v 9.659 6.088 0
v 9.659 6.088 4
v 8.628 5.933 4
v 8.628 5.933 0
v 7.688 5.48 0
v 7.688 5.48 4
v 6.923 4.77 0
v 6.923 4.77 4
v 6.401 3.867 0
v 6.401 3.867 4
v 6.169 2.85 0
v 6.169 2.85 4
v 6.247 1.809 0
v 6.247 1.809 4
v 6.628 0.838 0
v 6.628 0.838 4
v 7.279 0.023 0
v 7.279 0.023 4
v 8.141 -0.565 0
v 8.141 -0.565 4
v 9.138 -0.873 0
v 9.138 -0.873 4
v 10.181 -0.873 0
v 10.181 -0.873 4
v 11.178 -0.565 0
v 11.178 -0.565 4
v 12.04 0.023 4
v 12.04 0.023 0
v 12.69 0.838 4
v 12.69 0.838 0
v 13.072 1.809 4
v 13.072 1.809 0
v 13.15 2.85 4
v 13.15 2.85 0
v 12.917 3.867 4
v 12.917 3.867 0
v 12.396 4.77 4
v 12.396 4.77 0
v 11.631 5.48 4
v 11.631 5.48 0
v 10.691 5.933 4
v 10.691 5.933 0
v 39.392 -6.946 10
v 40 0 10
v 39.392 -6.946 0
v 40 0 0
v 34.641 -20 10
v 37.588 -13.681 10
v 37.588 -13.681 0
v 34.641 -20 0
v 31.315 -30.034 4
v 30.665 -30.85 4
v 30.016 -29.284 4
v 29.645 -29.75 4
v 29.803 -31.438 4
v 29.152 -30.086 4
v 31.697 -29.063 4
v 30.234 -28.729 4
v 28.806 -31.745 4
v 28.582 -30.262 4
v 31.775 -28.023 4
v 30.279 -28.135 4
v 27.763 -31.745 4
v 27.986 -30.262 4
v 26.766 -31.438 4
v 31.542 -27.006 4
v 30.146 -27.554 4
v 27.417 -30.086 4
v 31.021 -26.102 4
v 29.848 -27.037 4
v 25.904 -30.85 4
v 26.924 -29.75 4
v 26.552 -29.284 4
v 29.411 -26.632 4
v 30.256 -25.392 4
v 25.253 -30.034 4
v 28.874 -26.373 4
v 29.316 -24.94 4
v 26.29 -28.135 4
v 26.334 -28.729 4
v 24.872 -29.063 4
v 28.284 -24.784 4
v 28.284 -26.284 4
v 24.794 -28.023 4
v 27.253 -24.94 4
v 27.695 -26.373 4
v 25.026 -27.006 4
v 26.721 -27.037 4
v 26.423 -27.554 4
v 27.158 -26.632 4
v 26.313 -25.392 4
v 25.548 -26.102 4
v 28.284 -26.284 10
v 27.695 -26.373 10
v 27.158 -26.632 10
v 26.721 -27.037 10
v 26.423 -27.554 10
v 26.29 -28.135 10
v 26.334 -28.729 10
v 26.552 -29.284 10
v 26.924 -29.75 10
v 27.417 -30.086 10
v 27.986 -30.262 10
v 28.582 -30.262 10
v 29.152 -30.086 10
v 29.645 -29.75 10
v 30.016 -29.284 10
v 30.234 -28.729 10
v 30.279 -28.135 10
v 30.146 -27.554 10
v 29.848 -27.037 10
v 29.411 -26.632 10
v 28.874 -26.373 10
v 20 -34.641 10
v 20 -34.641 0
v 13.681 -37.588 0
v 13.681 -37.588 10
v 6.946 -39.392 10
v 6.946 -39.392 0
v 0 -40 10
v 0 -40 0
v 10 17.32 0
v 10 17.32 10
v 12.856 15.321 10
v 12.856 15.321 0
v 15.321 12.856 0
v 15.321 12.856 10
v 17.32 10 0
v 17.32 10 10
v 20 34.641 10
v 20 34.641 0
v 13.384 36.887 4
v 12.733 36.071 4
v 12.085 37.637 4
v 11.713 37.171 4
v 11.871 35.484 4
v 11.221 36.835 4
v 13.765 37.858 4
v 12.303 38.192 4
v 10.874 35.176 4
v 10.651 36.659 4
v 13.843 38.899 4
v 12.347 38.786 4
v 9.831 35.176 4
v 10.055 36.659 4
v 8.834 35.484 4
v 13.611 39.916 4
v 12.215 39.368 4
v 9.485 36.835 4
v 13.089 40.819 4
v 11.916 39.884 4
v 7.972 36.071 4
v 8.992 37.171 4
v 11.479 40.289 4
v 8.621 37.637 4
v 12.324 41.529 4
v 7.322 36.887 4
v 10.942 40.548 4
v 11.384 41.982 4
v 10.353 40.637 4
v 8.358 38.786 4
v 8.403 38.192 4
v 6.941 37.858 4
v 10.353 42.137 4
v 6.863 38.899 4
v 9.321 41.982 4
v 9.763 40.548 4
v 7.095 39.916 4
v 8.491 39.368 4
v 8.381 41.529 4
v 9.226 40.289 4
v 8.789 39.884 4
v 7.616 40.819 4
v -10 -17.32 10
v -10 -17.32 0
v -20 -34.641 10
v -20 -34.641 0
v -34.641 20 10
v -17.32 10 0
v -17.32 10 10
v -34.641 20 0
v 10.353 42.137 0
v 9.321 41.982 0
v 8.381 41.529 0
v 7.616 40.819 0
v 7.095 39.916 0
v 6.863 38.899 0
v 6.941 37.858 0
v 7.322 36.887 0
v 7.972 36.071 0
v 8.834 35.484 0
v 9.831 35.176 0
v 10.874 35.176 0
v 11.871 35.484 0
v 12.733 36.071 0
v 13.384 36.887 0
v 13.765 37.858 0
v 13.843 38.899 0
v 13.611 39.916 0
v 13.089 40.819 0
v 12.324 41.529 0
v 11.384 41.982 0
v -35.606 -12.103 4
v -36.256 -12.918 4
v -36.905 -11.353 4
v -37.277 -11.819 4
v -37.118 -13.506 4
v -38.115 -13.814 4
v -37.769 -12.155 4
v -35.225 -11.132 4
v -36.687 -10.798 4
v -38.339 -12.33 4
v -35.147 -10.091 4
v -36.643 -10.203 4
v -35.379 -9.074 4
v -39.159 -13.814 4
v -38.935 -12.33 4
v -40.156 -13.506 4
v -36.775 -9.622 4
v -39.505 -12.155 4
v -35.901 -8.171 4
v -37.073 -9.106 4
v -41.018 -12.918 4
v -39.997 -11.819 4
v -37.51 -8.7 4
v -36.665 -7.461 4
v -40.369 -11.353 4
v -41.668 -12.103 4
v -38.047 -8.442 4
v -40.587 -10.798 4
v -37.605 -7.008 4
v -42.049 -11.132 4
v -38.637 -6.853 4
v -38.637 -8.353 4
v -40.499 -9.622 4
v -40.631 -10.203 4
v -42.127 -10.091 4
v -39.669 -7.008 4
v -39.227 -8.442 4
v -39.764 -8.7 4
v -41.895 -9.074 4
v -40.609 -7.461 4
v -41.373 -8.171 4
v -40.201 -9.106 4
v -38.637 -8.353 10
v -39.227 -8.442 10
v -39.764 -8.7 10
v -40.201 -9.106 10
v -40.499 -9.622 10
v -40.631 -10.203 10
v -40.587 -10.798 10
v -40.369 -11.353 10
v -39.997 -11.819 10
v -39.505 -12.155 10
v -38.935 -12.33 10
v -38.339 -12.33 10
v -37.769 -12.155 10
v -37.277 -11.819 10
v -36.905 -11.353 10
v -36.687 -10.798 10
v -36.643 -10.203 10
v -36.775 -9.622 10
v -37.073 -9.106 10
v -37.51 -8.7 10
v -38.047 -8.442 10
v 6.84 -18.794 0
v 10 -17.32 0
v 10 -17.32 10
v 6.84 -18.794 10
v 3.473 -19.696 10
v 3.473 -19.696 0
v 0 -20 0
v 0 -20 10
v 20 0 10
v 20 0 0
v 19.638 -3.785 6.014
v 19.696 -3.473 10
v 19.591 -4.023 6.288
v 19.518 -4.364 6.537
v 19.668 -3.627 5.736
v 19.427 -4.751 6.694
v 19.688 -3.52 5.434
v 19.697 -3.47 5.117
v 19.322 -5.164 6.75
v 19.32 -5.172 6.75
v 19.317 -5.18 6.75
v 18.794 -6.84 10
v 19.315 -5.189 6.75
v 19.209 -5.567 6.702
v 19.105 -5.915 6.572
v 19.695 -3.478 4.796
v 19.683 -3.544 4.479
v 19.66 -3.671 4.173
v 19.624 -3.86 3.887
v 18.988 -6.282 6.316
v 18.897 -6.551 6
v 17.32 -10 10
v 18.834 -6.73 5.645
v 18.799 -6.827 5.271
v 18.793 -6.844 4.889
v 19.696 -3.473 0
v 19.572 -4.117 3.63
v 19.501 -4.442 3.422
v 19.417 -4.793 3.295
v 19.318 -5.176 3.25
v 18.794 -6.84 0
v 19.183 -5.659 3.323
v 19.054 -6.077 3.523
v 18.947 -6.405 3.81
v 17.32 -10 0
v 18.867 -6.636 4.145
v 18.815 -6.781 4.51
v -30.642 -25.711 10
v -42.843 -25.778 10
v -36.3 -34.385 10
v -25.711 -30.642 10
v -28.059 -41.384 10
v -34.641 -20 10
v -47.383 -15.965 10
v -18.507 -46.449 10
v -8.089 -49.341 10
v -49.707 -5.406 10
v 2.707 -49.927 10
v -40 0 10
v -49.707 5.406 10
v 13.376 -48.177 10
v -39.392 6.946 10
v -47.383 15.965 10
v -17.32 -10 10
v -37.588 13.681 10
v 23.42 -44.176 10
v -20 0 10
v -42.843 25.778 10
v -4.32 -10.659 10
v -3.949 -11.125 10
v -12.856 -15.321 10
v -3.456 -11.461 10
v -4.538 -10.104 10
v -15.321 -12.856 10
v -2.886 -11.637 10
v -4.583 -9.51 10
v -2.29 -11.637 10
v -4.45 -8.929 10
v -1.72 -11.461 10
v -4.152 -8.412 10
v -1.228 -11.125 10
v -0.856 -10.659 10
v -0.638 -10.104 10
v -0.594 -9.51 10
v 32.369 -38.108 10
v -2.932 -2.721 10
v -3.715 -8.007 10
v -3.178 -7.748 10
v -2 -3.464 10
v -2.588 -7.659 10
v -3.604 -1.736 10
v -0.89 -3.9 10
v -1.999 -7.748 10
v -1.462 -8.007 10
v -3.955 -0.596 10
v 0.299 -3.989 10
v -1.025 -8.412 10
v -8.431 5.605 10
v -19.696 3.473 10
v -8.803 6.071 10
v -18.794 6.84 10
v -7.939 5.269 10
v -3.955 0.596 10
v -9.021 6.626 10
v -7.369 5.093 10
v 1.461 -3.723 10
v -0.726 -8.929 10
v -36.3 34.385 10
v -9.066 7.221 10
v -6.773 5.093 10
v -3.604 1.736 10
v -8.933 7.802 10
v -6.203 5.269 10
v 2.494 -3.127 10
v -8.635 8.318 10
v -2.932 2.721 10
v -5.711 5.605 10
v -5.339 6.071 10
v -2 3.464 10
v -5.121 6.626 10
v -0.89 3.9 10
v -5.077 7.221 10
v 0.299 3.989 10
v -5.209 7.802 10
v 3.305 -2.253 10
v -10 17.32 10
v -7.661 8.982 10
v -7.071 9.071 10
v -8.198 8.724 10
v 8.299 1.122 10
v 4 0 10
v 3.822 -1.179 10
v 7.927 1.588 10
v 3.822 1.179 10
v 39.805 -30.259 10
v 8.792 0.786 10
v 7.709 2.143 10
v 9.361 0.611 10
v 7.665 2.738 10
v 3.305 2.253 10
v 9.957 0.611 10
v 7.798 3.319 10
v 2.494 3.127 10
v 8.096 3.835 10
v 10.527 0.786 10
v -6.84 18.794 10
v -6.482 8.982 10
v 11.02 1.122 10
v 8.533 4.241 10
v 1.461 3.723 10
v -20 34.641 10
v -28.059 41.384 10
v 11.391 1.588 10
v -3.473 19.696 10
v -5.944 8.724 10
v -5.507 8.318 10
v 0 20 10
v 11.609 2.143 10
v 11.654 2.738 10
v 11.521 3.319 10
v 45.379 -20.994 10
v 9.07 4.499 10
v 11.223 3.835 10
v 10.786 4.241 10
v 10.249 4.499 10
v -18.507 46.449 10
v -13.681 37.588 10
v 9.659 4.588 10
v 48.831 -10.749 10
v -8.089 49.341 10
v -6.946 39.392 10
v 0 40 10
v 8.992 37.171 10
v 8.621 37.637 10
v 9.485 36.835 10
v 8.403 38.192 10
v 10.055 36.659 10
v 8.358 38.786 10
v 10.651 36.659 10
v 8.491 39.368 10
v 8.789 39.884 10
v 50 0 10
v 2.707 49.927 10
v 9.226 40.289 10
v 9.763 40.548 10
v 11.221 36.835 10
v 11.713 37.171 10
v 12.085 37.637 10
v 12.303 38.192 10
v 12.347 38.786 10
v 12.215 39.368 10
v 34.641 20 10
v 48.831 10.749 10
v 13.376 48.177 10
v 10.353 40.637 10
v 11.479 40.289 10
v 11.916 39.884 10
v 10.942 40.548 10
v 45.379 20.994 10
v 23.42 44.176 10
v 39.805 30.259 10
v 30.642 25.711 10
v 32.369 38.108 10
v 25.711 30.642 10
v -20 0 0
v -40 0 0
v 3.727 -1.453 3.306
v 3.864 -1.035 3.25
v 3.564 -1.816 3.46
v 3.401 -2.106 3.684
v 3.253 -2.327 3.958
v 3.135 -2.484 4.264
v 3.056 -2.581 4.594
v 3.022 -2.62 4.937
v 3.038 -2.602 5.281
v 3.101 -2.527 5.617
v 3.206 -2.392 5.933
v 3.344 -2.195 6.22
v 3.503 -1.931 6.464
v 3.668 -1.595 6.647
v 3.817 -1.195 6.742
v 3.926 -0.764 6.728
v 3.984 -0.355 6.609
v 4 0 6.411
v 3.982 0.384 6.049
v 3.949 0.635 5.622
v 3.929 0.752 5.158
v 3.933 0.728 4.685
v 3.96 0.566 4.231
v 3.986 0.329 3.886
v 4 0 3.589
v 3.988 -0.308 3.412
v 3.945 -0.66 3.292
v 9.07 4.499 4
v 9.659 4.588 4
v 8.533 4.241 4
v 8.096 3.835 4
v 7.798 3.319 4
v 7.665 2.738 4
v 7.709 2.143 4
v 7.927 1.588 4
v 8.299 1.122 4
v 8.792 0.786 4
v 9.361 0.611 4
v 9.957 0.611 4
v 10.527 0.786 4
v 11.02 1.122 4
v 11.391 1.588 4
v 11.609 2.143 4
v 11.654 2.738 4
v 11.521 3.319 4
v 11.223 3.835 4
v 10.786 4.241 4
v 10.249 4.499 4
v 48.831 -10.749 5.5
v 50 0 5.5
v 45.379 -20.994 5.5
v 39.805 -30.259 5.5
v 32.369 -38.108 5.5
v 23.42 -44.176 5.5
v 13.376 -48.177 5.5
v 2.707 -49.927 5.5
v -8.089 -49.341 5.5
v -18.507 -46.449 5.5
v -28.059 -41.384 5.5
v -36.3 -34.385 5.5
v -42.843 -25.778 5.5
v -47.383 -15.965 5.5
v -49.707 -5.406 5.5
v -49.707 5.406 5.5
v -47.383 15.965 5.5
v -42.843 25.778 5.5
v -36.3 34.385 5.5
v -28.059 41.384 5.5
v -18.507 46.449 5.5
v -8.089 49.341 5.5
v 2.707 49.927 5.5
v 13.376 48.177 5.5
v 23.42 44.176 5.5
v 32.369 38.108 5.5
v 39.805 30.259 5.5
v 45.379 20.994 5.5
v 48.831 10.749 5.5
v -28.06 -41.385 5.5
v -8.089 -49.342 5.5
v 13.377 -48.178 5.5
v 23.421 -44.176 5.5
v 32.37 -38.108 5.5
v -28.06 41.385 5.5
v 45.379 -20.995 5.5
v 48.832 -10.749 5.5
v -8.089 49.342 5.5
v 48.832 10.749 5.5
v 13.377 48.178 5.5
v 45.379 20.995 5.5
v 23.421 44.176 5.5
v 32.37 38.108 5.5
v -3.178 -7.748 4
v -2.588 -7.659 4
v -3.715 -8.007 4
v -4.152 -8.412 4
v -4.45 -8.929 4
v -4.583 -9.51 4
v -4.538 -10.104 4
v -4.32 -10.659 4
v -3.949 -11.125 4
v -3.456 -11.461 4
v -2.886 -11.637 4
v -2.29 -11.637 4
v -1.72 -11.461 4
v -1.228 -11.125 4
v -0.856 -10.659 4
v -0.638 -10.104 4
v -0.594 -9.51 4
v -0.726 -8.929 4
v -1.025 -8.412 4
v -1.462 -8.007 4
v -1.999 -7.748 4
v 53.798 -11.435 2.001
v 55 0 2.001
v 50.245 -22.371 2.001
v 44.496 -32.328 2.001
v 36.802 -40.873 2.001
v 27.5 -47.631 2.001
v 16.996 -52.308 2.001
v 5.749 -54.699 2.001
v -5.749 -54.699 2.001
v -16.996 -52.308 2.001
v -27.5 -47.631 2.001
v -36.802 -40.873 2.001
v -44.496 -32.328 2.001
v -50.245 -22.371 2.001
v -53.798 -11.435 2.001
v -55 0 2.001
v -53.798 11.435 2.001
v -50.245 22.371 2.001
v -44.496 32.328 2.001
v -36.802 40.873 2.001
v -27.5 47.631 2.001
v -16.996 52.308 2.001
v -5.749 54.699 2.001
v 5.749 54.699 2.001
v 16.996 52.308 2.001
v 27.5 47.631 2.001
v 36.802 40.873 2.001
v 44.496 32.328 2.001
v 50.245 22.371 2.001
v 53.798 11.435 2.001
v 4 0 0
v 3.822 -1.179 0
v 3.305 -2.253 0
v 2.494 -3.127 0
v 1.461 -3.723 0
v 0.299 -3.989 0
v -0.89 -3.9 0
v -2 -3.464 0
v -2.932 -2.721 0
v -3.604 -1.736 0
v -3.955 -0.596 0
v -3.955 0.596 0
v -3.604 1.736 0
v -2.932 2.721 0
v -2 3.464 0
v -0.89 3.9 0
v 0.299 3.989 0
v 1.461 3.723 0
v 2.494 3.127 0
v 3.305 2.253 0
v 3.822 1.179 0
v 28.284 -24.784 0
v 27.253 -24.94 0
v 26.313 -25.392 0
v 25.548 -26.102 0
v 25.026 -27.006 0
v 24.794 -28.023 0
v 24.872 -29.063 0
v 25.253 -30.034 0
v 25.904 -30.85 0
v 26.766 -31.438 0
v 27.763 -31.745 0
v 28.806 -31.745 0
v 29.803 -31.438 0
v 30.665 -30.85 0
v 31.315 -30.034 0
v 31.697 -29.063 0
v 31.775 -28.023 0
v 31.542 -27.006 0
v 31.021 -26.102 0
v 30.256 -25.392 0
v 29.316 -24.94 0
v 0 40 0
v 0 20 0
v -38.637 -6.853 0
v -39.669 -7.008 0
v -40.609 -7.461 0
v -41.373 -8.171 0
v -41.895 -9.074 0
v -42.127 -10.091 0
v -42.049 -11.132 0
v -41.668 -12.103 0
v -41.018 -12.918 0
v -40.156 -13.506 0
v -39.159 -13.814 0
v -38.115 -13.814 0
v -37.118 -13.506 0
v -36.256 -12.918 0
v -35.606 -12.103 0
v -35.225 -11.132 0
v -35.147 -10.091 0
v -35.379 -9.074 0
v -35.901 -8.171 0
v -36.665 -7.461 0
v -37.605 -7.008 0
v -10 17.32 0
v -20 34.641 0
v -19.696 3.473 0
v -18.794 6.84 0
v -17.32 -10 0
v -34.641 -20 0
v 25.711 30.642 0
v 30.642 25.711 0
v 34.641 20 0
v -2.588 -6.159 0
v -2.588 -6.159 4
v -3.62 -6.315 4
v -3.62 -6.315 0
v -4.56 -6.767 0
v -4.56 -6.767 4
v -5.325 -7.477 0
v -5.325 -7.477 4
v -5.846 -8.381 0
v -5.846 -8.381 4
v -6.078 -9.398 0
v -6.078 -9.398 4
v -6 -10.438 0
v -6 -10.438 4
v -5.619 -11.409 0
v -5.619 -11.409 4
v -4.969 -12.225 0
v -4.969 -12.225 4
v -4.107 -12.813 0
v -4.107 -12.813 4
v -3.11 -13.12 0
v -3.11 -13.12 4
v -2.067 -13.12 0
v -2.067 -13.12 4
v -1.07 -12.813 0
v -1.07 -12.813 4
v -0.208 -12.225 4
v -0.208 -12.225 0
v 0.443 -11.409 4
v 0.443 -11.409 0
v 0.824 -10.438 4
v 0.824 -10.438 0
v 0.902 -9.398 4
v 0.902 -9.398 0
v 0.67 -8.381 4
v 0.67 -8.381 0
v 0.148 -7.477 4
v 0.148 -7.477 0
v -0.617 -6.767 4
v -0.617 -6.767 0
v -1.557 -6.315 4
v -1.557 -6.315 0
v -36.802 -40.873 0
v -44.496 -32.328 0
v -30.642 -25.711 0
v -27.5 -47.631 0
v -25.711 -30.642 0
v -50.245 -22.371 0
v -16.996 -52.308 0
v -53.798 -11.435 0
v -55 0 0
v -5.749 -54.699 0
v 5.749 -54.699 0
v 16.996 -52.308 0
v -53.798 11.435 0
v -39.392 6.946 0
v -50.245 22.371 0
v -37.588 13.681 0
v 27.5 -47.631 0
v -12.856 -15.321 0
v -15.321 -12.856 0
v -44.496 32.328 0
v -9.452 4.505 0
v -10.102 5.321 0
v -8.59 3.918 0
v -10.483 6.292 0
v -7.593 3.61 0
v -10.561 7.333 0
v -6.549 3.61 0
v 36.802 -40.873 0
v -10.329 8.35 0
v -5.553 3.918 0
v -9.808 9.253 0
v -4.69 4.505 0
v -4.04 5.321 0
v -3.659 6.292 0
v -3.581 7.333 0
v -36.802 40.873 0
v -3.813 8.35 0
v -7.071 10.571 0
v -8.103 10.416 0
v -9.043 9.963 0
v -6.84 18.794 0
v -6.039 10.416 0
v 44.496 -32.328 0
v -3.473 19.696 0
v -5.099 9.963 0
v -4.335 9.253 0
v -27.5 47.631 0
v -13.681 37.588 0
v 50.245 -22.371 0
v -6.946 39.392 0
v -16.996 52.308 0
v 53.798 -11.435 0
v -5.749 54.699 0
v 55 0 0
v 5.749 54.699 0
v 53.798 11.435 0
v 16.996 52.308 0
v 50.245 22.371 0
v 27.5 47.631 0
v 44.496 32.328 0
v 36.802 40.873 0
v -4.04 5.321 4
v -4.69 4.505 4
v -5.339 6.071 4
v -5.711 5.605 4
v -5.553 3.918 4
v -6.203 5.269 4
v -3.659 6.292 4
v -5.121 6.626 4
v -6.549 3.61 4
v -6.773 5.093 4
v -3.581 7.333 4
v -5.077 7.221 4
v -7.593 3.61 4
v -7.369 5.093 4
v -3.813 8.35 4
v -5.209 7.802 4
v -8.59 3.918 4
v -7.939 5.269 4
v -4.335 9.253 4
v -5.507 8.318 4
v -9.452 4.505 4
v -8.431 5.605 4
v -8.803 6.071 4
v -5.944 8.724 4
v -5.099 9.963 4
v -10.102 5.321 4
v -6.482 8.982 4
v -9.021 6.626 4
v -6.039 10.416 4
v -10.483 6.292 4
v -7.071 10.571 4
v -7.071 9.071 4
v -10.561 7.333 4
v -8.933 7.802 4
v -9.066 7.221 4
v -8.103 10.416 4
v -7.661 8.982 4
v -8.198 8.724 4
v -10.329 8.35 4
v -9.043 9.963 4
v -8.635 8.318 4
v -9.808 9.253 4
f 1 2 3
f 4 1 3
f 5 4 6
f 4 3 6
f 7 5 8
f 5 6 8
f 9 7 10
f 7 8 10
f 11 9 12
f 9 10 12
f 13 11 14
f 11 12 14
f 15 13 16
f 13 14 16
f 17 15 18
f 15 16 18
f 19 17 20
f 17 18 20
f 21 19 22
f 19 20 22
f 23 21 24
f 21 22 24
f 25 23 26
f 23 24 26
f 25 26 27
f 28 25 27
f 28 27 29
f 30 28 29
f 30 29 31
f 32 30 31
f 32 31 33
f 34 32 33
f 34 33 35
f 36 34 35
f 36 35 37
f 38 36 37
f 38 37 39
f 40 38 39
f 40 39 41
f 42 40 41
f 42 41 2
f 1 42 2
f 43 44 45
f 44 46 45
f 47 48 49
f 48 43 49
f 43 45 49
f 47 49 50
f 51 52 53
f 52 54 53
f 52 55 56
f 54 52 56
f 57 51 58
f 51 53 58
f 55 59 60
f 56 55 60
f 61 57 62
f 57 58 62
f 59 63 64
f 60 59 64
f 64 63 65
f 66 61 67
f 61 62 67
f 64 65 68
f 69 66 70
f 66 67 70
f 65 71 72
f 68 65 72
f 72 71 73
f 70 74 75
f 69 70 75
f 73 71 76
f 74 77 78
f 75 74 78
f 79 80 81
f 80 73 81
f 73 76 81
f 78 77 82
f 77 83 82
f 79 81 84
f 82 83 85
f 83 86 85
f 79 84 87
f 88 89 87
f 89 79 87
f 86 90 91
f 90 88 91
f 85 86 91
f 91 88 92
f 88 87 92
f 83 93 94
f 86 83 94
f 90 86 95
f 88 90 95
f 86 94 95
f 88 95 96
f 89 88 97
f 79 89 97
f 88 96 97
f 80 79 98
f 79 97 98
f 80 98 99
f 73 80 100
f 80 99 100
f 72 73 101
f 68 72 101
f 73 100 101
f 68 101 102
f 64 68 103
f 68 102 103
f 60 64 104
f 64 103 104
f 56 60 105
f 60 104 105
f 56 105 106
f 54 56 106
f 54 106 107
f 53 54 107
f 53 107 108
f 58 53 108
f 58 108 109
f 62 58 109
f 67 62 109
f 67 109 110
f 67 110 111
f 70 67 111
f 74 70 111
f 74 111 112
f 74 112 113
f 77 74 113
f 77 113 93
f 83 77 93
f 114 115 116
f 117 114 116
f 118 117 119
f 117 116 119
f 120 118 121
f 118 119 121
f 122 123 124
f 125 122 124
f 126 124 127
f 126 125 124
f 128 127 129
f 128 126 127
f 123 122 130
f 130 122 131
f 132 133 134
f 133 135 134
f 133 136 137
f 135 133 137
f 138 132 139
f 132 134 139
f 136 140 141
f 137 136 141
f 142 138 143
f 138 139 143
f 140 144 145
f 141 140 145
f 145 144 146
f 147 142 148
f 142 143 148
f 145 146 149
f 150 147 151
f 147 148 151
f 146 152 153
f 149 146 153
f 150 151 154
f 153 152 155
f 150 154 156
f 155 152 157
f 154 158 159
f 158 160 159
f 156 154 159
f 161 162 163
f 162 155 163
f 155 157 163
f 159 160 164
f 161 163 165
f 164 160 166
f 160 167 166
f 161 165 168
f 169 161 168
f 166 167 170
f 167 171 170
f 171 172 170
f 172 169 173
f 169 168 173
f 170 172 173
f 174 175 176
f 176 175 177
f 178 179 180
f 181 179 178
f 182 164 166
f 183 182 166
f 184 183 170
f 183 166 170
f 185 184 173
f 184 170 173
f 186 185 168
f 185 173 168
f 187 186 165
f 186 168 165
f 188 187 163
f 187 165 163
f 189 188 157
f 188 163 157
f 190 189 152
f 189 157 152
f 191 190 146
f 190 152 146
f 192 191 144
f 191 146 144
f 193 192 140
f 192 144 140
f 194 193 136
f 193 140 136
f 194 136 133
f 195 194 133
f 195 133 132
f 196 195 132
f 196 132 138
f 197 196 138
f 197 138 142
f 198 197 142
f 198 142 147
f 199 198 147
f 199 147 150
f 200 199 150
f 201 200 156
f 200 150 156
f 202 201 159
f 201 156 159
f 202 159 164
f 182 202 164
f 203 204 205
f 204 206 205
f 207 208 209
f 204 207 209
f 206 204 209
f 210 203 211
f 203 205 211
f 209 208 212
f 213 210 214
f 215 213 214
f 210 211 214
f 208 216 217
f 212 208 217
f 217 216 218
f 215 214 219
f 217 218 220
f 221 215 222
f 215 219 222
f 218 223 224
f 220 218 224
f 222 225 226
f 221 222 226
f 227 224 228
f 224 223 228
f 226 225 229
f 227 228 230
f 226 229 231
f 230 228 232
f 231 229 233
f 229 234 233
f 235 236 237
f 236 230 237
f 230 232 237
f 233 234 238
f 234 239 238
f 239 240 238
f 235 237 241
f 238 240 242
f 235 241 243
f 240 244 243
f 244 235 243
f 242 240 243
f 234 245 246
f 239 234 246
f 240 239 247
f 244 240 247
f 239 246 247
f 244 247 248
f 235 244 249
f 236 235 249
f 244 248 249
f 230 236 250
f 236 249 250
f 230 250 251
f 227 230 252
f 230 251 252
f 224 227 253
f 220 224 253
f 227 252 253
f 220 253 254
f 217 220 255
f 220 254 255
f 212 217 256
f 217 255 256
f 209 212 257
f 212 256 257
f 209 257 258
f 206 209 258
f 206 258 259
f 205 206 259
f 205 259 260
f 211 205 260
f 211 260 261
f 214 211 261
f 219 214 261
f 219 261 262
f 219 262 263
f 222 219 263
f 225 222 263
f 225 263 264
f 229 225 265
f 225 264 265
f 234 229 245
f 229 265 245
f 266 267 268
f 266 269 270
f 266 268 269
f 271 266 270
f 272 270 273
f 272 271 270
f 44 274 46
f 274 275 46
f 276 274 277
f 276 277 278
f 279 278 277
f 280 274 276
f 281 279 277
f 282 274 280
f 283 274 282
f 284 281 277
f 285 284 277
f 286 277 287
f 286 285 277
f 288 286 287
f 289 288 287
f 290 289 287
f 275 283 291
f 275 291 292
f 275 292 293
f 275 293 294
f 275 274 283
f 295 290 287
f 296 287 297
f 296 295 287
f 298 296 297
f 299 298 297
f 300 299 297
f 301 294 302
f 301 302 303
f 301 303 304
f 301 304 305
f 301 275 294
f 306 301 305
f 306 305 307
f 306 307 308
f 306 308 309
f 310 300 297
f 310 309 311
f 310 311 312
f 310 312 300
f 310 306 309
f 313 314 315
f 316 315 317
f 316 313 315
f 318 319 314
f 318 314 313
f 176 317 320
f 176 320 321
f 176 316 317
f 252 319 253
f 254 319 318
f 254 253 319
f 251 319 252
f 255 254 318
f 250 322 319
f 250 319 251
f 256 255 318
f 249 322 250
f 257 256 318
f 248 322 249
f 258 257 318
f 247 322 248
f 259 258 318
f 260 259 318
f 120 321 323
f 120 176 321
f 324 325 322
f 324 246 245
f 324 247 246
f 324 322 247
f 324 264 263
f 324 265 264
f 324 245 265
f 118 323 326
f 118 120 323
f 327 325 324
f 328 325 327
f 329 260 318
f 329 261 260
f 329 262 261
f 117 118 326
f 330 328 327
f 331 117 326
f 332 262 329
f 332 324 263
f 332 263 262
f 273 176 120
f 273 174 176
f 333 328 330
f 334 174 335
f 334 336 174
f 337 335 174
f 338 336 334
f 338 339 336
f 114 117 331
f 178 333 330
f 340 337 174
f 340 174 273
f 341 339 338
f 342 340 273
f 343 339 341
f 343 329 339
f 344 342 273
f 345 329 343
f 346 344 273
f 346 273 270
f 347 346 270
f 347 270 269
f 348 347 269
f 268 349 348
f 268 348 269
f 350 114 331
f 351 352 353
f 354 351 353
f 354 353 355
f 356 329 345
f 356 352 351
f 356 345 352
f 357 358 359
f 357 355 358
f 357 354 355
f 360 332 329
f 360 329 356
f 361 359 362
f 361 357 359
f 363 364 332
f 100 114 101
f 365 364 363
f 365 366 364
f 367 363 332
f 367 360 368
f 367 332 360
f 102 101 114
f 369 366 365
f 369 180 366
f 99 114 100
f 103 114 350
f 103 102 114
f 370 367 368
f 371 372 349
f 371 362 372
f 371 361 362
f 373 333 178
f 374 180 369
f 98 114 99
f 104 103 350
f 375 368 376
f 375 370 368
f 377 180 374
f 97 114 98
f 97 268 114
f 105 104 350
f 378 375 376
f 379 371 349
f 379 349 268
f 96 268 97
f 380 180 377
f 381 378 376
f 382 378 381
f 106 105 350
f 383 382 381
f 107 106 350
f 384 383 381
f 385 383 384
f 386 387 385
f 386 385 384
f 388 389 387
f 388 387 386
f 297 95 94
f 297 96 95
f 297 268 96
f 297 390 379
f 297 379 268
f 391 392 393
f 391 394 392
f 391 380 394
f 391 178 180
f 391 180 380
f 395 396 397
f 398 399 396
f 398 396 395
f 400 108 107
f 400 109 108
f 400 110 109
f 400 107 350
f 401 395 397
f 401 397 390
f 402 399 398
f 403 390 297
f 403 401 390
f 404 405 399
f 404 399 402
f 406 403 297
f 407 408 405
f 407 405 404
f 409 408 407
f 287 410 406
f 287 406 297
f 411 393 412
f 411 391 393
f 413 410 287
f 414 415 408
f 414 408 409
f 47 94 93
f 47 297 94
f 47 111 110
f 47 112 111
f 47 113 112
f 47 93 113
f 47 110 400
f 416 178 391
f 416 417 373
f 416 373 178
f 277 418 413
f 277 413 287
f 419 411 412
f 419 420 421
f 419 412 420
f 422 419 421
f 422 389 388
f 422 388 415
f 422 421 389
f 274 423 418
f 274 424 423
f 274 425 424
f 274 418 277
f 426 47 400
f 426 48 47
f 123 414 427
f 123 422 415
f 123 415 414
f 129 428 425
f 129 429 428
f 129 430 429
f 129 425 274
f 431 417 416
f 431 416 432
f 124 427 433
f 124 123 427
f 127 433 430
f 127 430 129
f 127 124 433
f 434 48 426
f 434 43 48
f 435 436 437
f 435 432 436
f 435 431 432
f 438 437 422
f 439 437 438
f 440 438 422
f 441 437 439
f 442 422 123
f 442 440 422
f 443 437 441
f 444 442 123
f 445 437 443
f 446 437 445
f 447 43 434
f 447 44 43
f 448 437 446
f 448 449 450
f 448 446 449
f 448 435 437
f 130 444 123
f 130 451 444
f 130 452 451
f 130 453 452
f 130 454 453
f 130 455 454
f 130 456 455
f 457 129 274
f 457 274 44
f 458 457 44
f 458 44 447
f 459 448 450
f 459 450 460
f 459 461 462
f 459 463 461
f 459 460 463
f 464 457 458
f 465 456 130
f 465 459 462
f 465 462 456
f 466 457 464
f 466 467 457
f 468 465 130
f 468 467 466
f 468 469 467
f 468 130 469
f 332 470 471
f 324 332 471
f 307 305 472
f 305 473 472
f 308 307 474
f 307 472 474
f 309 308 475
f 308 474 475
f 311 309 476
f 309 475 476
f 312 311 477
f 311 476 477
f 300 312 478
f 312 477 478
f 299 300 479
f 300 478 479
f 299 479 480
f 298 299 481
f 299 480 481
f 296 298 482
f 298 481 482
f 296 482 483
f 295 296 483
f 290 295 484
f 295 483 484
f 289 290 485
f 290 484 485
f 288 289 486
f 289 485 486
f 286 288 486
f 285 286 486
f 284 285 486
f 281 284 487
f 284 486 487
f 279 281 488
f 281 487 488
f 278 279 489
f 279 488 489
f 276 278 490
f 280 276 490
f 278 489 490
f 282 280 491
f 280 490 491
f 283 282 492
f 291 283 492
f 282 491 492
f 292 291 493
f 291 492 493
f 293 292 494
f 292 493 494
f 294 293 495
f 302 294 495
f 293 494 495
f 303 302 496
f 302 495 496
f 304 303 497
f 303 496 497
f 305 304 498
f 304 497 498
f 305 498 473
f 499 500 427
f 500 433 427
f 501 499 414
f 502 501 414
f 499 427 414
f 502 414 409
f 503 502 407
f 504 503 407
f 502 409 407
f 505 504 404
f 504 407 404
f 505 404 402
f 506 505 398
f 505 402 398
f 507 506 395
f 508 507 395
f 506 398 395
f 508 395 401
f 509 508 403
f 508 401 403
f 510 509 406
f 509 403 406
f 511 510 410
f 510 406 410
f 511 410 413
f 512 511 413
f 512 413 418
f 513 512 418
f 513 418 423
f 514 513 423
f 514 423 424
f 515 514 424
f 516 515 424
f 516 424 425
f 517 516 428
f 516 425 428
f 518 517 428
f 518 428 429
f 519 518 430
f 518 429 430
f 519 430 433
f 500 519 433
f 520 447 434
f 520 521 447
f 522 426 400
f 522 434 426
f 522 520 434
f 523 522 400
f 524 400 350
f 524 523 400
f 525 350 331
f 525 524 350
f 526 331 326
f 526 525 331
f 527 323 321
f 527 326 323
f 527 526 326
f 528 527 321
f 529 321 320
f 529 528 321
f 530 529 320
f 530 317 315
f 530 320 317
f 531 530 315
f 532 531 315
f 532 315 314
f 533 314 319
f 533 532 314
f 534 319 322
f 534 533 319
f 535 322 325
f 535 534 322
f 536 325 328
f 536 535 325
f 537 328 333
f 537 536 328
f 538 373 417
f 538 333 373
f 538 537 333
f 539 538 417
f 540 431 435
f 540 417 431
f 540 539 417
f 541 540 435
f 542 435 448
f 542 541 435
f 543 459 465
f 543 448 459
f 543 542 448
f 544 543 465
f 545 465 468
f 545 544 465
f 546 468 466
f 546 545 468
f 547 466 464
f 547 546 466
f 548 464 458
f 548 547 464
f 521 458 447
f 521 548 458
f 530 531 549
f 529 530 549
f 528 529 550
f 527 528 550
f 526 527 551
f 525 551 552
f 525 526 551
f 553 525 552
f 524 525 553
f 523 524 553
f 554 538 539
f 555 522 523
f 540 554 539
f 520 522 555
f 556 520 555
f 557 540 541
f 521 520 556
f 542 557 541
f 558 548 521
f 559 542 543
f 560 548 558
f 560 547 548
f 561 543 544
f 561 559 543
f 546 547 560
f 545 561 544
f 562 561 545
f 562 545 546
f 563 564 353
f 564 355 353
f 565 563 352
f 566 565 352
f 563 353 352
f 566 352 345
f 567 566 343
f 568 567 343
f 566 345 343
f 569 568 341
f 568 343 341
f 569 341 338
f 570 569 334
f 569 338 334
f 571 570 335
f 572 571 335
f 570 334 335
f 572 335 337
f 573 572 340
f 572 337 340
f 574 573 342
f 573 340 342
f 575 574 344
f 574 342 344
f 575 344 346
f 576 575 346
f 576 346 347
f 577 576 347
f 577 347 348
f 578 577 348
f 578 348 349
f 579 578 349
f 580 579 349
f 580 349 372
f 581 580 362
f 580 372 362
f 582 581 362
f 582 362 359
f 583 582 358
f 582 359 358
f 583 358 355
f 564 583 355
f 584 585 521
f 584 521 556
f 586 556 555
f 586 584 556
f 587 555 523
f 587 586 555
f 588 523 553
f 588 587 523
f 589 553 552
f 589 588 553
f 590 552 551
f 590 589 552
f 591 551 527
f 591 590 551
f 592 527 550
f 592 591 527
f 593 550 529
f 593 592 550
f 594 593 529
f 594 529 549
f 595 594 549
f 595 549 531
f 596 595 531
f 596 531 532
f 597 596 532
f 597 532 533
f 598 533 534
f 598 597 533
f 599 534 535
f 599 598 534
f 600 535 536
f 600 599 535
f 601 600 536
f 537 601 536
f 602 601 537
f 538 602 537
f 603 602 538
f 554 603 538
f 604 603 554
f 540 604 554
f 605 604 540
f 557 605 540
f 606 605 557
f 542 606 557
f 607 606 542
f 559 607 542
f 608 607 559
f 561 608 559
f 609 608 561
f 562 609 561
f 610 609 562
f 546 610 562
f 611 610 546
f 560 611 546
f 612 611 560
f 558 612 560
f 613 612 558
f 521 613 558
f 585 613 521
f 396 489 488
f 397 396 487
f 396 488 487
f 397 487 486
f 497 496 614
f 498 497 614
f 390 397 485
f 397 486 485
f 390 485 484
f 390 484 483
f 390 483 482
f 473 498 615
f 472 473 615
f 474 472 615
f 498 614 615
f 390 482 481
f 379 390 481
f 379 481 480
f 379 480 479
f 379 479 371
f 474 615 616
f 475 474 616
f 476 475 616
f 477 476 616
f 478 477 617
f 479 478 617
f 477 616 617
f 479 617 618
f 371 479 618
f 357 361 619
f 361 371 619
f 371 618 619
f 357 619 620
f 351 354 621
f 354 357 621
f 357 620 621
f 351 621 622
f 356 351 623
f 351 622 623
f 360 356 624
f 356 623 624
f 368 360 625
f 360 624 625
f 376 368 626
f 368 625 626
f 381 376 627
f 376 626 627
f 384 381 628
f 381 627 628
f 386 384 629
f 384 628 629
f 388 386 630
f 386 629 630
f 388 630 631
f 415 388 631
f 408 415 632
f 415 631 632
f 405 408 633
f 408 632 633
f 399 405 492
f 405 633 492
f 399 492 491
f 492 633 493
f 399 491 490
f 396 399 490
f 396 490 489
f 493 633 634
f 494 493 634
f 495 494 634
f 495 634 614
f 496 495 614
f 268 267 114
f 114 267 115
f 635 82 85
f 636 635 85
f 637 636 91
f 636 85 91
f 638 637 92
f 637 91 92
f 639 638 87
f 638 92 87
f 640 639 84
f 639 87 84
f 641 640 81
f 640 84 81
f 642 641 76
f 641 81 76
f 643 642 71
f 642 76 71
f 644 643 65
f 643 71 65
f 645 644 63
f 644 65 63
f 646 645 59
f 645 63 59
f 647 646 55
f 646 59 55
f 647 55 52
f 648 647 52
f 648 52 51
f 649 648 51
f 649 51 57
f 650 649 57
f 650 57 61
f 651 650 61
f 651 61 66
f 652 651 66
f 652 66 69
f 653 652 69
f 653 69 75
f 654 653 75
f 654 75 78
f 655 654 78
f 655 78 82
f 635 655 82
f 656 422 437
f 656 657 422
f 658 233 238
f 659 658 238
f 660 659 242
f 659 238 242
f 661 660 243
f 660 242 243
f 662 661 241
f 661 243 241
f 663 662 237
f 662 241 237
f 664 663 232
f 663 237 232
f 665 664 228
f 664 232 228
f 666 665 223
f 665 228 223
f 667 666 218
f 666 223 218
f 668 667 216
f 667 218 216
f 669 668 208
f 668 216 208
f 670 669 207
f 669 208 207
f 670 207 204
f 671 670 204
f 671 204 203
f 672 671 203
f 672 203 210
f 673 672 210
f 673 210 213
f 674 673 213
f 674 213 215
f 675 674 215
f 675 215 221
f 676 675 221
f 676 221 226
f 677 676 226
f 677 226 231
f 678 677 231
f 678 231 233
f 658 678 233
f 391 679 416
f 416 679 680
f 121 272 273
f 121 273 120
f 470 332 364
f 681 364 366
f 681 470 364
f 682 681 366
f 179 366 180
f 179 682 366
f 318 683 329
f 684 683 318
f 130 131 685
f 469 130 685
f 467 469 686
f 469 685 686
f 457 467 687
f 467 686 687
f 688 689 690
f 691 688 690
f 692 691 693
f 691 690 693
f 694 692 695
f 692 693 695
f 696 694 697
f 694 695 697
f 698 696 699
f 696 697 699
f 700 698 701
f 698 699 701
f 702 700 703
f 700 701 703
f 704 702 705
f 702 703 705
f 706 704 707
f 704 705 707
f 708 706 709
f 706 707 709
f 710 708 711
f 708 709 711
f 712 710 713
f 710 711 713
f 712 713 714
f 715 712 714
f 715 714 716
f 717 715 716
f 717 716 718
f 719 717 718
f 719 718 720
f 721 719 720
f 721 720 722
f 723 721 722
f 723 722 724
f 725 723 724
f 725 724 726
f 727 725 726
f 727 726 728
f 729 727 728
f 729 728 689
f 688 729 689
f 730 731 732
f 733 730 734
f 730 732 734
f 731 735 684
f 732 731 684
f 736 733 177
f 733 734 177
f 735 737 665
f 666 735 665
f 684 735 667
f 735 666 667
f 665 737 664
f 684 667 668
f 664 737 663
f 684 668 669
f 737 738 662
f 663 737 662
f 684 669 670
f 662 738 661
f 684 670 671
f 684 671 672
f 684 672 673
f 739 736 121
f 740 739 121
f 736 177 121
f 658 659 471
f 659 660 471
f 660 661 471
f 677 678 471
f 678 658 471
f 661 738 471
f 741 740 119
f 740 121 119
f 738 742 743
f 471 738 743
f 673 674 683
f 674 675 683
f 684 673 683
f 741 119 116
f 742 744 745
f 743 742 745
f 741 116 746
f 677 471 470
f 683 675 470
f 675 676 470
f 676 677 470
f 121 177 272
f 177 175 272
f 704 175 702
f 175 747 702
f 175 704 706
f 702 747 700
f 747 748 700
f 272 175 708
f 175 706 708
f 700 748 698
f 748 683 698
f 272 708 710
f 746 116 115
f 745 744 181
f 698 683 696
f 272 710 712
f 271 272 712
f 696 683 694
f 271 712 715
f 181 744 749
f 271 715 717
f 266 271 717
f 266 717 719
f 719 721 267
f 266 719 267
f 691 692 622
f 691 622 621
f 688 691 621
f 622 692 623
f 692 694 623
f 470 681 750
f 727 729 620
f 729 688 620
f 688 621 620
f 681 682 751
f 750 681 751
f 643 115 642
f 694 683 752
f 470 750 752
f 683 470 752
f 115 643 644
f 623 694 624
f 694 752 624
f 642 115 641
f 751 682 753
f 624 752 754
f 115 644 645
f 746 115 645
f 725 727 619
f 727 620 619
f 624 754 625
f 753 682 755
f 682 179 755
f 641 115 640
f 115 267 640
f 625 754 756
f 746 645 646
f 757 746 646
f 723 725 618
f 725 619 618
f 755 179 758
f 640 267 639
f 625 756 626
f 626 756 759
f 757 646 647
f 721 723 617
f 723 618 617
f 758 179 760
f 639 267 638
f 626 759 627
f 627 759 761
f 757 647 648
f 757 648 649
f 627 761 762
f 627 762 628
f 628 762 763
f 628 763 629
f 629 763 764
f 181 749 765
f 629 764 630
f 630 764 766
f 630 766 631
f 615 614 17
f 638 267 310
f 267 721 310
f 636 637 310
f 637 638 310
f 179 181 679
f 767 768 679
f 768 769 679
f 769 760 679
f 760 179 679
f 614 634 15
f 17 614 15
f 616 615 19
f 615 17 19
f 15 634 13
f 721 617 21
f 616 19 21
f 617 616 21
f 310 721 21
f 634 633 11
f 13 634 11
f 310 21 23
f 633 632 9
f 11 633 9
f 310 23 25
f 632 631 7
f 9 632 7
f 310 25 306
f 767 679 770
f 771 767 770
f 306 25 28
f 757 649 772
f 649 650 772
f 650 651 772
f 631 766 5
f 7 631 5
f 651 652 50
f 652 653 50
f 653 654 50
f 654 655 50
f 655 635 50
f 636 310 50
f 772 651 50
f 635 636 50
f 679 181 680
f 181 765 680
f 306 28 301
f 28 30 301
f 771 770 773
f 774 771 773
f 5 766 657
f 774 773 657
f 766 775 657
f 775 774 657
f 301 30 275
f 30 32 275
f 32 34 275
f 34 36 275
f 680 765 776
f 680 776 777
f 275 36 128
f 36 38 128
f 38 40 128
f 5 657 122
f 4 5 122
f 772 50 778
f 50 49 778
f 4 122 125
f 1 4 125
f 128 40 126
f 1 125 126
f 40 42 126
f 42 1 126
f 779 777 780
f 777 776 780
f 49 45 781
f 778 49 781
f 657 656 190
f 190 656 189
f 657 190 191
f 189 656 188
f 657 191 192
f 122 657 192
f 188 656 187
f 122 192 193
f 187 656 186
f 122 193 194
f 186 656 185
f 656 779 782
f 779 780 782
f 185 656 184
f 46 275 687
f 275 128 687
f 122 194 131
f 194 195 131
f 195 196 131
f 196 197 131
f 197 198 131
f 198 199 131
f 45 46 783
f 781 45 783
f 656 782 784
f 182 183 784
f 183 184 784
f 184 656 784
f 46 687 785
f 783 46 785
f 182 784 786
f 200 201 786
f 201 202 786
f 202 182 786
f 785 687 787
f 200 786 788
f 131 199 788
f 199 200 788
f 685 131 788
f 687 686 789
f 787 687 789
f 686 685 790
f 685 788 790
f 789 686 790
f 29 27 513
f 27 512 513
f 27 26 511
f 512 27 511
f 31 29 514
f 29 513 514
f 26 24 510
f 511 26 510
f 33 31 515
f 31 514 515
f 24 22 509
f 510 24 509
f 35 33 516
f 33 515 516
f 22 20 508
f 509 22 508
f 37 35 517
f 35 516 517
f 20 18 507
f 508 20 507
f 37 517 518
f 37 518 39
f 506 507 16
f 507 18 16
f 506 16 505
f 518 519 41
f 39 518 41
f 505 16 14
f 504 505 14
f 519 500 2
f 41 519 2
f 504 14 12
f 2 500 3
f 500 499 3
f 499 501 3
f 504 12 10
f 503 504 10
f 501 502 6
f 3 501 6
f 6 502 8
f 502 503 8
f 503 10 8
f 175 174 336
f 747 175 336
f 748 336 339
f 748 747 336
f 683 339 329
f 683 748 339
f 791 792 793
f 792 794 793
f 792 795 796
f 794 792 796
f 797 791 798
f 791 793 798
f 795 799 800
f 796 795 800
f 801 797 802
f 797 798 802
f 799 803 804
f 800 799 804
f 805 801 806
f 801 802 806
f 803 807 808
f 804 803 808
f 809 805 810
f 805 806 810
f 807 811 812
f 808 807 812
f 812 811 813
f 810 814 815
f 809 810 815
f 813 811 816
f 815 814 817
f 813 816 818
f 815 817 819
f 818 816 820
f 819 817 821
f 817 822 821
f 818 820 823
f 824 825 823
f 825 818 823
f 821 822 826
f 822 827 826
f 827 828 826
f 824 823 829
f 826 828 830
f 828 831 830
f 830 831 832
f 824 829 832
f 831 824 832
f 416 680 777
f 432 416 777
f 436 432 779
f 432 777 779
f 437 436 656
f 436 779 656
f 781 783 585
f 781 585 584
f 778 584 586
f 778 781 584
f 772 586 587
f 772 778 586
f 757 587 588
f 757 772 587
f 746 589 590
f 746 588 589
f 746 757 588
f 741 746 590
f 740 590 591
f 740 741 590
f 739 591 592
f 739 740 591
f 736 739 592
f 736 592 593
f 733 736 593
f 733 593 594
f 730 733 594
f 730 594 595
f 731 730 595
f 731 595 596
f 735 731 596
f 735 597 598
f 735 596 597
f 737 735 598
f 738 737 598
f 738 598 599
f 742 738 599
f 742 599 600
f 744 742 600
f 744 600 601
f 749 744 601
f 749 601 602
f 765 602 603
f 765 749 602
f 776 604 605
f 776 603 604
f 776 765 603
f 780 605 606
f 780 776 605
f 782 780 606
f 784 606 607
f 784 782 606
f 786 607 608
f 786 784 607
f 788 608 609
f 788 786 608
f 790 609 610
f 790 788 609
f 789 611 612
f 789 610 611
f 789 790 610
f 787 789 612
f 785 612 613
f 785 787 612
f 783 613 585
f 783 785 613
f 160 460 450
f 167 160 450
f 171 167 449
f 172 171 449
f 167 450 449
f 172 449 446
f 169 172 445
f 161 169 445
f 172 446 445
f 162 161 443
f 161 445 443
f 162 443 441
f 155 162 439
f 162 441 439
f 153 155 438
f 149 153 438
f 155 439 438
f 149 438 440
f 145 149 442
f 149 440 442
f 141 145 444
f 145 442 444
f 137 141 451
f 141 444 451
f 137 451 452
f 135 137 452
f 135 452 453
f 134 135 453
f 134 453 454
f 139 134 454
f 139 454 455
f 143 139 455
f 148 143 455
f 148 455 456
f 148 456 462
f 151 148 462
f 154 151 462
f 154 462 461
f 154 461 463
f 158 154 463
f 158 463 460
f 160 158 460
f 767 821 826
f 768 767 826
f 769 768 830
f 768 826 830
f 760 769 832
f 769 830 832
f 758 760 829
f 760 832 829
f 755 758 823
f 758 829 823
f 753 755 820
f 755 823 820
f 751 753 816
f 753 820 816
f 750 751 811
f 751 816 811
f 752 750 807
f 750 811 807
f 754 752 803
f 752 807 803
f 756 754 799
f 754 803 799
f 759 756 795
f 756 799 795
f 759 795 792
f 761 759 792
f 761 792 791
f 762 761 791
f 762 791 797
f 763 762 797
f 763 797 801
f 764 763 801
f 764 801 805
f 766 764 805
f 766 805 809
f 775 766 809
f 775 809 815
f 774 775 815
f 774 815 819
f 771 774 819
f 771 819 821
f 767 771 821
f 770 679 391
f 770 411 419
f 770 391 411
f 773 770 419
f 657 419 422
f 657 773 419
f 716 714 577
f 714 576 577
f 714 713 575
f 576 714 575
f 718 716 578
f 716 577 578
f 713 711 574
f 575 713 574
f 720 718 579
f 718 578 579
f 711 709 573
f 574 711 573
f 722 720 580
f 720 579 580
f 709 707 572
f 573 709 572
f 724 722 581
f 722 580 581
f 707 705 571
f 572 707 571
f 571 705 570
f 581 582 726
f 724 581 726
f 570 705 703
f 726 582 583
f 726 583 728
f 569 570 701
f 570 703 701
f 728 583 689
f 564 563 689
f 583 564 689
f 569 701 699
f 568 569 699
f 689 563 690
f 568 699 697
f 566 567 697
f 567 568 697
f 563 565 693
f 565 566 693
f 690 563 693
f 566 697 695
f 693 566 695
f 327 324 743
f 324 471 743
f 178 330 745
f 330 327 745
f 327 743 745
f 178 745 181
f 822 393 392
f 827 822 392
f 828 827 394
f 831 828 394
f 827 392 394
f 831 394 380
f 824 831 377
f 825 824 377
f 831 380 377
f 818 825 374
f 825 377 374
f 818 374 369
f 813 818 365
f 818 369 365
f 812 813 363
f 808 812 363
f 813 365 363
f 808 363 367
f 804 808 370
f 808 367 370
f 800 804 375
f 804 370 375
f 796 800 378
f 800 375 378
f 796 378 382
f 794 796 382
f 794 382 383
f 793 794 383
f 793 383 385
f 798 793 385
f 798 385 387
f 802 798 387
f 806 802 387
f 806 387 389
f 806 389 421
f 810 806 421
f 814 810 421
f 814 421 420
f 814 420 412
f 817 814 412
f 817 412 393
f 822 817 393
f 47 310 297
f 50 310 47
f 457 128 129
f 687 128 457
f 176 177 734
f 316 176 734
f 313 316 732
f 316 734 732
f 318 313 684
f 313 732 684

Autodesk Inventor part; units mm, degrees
ref_plane "YZ Plane" through (0, 0, 0) normal (1, 0, 0) x (0, 1, 0)
ref_plane "XZ Plane" through (0, 0, 0) normal (0, 1, 0) x (-1, 0, 0)
sketch "Sketch1" plane through (0, 0, 0) normal (0, 0, 1) x (1, 0, 0)
  circle A0 centre (0, 0) radius 55
  circle A1 centre (0, 0) radius 50
  circle A2 centre (0, 0) radius 4
  line L0 (0, 20) -> (0, 40)
  arc A3 (0, 20) -> (-10, 17.3205) centre (0, 0) ccw
  line L1 (0, 0) -> (-10, 17.3205) construction
  line L2 (0, 0) -> (0, 20) construction
  arc A4 (0, 40) -> (-20, 34.641) centre (0, 0) ccw
  line L3 (0, 0) -> (-20, 34.641) construction
  line L4 (0, 0) -> (0, 40) construction
  line L5 (-10, 17.3205) -> (-20, 34.641)
  line L6 (-17.3205, 10) -> (-34.641, 20)
  arc A5 (-17.3205, 10) -> (-20, 0) centre (0, 0) ccw
  line L7 (0, 0) -> (-20, 0) construction
  line L8 (0, 0) -> (-17.3205, 10) construction
  arc A6 (-34.641, 20) -> (-40, 0) centre (0, 0) ccw
  line L9 (0, 0) -> (-40, 0) construction
  line L10 (0, 0) -> (-34.641, 20) construction
  line L11 (-20, 0) -> (-40, 0)
  line L12 (-17.3205, -10) -> (-34.641, -20)
  arc A7 (-17.3205, -10) -> (-10, -17.3205) centre (0, 0) ccw
  line L13 (0, 0) -> (-10, -17.3205) construction
  line L14 (0, 0) -> (-17.3205, -10) construction
  arc A8 (-34.641, -20) -> (-20, -34.641) centre (0, 0) ccw
  line L15 (0, 0) -> (-20, -34.641) construction
  line L16 (0, 0) -> (-34.641, -20) construction
  line L17 (-10, -17.3205) -> (-20, -34.641)
  line L18 (0, -20) -> (0, -40)
  arc A9 (0, -20) -> (10, -17.3205) centre (0, 0) ccw
  line L19 (0, 0) -> (10, -17.3205) construction
  line L20 (0, 0) -> (0, -20) construction
  arc A10 (0, -40) -> (20, -34.641) centre (0, 0) ccw
  line L21 (0, 0) -> (20, -34.641) construction
  line L22 (0, 0) -> (0, -40) construction
  line L23 (10, -17.3205) -> (20, -34.641)
  line L24 (17.3205, -10) -> (34.641, -20)
  arc A11 (17.3205, -10) -> (20, 0) centre (0, 0) ccw
  line L25 (0, 0) -> (20, 0) construction
  line L26 (0, 0) -> (17.3205, -10) construction
  arc A12 (34.641, -20) -> (40, 0) centre (0, 0) ccw
  line L27 (0, 0) -> (40, 0) construction
  line L28 (0, 0) -> (34.641, -20) construction
  line L29 (20, 0) -> (40, 0)
  line L30 (17.3205, 10) -> (34.641, 20)
  arc A13 (17.3205, 10) -> (10, 17.3205) centre (0, 0) ccw
  line L31 (0, 0) -> (10, 17.3205) construction
  line L32 (0, 0) -> (17.3205, 10) construction
  arc A14 (34.641, 20) -> (20, 34.641) centre (0, 0) ccw
  line L33 (0, 0) -> (20, 34.641) construction
  line L34 (0, 0) -> (34.641, 20) construction
  line L35 (10, 17.3205) -> (20, 34.641)
  point P0 (0, 10)
  point P1 (-2.5882, 9.6593)
  point P2 (-5, 8.6603)
  point P3 (-7.0711, 7.0711)
  point P4 (-8.6603, 5)
  point P5 (-9.6593, 2.5882)
  point P6 (-10, 0)
  point P7 (-9.6593, -2.5882)
  point P8 (-8.6603, -5)
  point P9 (-7.0711, -7.0711)
  point P10 (-5, -8.6603)
  point P11 (-2.5882, -9.6593)
  point P12 (0, -10)
  point P13 (2.5882, -9.6593)
  point P14 (5, -8.6603)
  point P15 (7.0711, -7.0711)
  point P16 (8.6603, -5)
  point P17 (9.6593, -2.5882)
  point P18 (10, 0)
  point P19 (9.6593, 2.5882)
  point P20 (8.6603, 5)
  point P21 (7.0711, 7.0711)
  point P22 (5, 8.6603)
  point P23 (2.5882, 9.6593)
  point P24 (10.3528, -38.637)
  point P25 (20, -34.641)
  point P26 (28.2843, -28.2843)
  point P27 (34.641, -20)
  point P28 (38.637, -10.3528)
  point P29 (40, 0)
  point P30 (38.637, 10.3528)
  point P31 (34.641, 20)
  point P32 (28.2843, 28.2843)
  point P33 (20, 34.641)
  point P34 (10.3528, 38.637)
  point P35 (0, 40)
  point P36 (-10.3528, 38.637)
  point P37 (-20, 34.641)
  point P38 (-28.2843, 28.2843)
  point P39 (-34.641, 20)
  point P40 (-38.637, 10.3528)
  point P41 (-40, 0)
  point P42 (-38.637, -10.3528)
  point P43 (-34.641, -20)
  point P44 (-28.2843, -28.2843)
  point P45 (-20, -34.641)
  point P46 (-10.3528, -38.637)
  dimension "d1" = 100
  dimension "d2" = 8
  dimension "d11" = 20
  dimension "d12" = 20
  dimension "d13" = 30
  dimension "d14" = 30
  dimension "d17" = 360
  dimension "d34" = 10
  dimension "d37" = 360
  dimension "d48" = 360
  dimension "d57" = 110
extrude "Extrusion1" add sketch "Sketch1" along normal blind 10 contours A1
extrude "Extrusion2" add sketch "Sketch1" along normal blind 5.5 contours A0
hole "Hole2" at (-2.5882, -9.6593, 0) at (-7.0711, 7.0711, 0) at (9.6593, 2.5882, 0) direction (0, 0, 1) diameter 4 end through all counterbore diameter 7 counterbore depth 4
hole "Hole3" at (28.2843, -28.2843, 0) at (-38.637, -10.3528, 0) at (10.3528, 38.637, 0) direction (0, 0, 1) diameter 4 end through all counterbore diameter 7 counterbore depth 4
chamfer "Chamfer2" distance 3.5 distance2 5 1 edges at (-55, 0, 5.5) measured on face at (-50.386, -22.0512, 3.6667)
ref_plane "Work Plane3" through (19.3185, -5.1764, 0) normal (-0.9659, 0.2588, 0) x (-0.2588, -0.9659, 0)
sketch "Sketch3" plane through (19.3185, -5.1764, 0) normal (-0.9659, 0.2588, 0) x (-0.2588, -0.9659, 0)
  point P0 (0, 0)
  point P1 (0, 5)
  dimension "d61" = 5
hole "Hole4" at (19.3185, -5.1764, 5) direction (-0.9659, 0.2588, 0) diameter 3.5 depth 20
properties part number "wheel small" material "UHMW, Black"
